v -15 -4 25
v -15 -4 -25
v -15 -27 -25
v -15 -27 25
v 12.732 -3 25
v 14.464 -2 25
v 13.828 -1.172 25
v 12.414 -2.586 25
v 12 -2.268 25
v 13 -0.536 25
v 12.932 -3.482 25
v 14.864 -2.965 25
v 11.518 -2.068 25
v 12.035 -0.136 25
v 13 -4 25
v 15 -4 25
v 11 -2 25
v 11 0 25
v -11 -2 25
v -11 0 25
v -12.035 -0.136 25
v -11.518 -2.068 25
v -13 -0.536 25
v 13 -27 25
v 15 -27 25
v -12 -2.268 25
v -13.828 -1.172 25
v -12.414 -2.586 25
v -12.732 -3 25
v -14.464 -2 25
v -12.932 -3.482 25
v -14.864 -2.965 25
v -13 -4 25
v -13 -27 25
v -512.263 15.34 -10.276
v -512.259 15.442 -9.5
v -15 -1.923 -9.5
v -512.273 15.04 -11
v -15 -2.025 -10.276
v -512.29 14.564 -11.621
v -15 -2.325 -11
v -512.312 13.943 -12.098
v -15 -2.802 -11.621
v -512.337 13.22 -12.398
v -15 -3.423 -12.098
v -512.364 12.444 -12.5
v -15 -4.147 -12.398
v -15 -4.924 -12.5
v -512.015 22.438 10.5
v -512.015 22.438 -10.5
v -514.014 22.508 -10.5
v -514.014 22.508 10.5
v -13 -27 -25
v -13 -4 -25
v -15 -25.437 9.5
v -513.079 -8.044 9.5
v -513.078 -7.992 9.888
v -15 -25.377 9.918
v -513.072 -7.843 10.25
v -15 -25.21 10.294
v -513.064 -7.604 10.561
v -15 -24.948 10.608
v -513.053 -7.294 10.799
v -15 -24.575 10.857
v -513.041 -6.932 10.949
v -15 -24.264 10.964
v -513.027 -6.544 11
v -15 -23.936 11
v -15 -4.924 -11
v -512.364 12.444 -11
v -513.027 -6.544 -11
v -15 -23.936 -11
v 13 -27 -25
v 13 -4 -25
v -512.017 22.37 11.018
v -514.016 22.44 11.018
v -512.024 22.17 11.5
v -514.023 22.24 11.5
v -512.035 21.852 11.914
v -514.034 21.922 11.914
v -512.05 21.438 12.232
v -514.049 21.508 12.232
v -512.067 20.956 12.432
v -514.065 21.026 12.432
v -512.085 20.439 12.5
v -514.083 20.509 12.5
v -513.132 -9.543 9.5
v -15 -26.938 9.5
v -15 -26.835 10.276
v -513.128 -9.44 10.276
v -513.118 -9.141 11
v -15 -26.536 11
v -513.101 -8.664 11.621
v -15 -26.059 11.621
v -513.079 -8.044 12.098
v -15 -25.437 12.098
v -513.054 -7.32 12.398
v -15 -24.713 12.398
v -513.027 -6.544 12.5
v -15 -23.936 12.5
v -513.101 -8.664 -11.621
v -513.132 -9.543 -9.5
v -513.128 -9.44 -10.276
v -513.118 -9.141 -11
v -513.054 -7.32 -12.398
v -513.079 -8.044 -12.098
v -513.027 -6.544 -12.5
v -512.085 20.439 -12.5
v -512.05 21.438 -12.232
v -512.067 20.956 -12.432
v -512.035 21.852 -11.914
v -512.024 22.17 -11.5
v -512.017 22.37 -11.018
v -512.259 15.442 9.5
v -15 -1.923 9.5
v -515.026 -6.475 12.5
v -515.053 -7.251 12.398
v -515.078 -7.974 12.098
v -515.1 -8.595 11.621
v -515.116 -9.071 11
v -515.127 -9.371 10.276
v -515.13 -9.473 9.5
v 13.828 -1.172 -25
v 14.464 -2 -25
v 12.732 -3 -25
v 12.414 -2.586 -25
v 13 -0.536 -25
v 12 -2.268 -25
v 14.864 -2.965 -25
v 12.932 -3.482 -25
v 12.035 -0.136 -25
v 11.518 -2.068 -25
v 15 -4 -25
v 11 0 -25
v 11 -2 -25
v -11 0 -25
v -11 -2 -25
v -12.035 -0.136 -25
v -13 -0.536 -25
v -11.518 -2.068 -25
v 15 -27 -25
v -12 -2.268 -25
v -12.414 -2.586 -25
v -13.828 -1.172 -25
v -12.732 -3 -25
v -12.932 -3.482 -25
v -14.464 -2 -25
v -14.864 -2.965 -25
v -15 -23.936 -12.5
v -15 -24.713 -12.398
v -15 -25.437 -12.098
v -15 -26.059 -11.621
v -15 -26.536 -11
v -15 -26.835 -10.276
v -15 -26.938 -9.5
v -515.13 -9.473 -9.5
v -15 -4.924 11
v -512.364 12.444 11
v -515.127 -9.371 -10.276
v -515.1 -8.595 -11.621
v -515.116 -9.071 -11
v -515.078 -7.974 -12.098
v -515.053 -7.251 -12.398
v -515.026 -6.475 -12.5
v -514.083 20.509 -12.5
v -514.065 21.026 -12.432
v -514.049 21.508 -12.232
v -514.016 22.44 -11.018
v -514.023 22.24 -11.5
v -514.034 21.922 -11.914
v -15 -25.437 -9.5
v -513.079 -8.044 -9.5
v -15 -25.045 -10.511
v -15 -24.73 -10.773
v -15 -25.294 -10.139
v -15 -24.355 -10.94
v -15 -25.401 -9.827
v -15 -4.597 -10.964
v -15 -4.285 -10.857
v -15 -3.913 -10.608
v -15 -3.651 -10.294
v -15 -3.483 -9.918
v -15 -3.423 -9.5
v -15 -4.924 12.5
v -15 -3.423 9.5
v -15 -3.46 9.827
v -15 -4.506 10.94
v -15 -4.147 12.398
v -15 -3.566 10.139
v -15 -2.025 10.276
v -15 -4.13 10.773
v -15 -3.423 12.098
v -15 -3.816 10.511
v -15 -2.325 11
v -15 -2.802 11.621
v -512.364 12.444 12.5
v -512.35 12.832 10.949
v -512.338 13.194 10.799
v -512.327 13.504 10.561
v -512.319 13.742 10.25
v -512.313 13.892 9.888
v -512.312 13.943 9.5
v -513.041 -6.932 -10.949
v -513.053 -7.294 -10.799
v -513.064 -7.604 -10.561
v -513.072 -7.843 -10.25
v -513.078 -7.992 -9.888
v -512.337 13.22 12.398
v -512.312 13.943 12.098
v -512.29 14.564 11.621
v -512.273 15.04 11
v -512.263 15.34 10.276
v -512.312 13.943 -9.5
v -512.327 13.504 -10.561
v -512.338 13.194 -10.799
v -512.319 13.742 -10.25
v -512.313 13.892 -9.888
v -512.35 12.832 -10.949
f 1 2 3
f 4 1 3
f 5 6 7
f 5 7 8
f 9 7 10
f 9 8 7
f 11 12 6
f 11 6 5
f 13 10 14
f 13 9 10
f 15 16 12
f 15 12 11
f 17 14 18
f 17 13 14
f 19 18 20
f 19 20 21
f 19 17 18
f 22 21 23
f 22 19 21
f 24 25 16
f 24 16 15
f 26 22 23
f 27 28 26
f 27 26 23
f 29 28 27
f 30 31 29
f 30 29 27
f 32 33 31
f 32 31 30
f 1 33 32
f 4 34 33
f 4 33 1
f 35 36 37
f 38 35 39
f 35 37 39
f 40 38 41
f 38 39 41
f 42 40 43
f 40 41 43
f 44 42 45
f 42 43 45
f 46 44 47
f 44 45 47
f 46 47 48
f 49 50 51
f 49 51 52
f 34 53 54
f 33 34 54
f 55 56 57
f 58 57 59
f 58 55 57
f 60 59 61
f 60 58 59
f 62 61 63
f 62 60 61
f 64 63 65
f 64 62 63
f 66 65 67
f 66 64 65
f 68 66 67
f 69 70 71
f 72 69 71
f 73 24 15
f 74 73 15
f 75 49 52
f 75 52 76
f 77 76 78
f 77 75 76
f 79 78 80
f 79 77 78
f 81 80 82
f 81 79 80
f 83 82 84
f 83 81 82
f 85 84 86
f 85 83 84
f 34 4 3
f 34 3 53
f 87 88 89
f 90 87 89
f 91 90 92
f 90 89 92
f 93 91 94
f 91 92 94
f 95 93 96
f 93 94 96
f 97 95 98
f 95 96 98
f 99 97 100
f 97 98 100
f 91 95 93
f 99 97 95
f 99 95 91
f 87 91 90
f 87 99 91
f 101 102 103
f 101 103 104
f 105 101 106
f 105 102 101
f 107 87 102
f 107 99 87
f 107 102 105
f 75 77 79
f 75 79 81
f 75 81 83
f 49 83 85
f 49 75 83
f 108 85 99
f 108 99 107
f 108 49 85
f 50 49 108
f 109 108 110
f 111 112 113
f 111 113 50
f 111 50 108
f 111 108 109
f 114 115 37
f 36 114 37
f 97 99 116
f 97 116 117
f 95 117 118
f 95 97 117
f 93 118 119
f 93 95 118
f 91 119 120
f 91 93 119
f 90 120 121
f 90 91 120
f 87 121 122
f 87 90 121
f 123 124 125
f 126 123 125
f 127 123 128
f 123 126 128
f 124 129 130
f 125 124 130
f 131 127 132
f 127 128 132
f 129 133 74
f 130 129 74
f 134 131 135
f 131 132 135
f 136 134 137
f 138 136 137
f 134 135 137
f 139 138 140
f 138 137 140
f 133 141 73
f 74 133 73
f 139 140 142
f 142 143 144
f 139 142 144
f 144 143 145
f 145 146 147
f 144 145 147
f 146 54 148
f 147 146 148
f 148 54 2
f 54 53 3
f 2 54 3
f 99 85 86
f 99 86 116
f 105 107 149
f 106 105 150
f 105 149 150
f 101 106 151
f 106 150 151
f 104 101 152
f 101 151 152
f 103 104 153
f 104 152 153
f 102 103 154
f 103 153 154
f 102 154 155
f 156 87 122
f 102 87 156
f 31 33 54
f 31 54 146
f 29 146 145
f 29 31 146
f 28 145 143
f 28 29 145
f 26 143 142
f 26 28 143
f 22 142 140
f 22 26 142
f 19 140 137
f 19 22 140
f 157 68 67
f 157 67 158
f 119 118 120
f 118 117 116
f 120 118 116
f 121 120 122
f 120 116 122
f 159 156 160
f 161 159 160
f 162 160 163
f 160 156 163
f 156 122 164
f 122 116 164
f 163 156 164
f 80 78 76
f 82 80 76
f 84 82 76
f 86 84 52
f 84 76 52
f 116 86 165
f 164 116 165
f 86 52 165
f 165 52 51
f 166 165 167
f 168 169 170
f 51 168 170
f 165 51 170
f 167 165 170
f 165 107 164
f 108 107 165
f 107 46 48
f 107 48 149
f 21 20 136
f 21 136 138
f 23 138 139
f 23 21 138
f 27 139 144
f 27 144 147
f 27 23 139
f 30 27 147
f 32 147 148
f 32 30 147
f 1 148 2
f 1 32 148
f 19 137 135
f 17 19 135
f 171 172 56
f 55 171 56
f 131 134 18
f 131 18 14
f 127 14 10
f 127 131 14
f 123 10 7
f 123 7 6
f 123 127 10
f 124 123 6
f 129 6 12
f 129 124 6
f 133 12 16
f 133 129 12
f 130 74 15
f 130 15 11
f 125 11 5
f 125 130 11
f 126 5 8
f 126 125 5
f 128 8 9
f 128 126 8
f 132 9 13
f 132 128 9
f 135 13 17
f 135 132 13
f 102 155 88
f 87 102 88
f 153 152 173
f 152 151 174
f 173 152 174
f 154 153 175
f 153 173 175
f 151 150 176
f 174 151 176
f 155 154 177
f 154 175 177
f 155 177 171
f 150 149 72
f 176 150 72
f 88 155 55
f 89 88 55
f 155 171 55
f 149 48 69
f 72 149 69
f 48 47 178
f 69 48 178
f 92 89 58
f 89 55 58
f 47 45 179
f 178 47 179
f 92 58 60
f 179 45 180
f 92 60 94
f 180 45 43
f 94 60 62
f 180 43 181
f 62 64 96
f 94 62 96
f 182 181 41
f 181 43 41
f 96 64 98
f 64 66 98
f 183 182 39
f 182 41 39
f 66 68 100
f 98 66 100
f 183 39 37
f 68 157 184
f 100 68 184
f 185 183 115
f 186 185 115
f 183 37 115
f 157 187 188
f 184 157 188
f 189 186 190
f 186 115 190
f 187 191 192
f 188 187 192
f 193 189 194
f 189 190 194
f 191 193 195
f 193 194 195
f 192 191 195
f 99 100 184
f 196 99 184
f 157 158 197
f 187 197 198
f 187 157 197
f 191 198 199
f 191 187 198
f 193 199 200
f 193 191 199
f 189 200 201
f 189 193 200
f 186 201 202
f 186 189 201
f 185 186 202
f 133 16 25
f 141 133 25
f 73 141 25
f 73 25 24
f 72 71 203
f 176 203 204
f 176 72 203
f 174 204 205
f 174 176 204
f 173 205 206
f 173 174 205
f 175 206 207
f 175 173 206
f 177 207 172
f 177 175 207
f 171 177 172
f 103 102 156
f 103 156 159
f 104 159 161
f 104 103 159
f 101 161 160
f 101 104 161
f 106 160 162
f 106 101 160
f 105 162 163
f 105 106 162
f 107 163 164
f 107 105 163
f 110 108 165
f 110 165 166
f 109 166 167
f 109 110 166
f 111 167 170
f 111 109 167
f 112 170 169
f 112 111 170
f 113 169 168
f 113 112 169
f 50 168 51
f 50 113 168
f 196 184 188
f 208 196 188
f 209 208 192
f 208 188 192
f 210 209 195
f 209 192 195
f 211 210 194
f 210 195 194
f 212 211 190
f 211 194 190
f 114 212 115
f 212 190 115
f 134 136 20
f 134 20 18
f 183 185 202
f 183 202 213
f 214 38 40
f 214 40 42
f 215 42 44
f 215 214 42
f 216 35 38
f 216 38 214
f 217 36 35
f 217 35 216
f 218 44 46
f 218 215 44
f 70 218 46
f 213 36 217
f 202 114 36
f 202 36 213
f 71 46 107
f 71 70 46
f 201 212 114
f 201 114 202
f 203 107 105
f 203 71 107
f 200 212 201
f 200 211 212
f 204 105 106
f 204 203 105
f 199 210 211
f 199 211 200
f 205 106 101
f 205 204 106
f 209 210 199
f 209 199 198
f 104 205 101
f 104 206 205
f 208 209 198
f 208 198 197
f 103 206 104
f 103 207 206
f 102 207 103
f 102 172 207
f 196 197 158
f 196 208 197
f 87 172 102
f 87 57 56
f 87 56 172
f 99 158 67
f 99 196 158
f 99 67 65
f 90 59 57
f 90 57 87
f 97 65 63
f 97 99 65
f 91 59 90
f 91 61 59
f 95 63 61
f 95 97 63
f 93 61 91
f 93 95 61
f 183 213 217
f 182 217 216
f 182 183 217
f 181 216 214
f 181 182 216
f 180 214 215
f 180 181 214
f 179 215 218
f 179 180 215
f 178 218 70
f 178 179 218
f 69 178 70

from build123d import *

# Parameters (mm, degrees)
SKETCH_1_W                     = 26
SKETCH_1_H                     = 50
SM_BASE_FLANGE_1_DEPTH         = 2
EDGE_FLANGE1_STRIP_W           = 12
EDGE_FLANGE1_STRIP_H           = 2
EDGE_FLANGE1_STRIP_CUT_DEPTH   = 50
EDGE_FLANGE1_STRIP_2_W         = 12
EDGE_FLANGE1_STRIP_2_H         = 2
EDGE_FLANGE1_STRIP_CUT_2_DEPTH = 50
EDGE_FLANGE1_DEPTH             = 50
EDGE_FLANGE1_BEND_DEPTH        = 50
F_2_X_2_X_0_25_1_DEPTH         = 500
SKETCH_15_W                    = 53.141638299
SKETCH_15_H                    = 32.279440364
CUT_EXTRUDE_1_DEPTH            = 500.488886686
EXTRUDE_2_DEPTH                = 2


# Sheet-metal steps are written as plain solids
with BuildPart() as part:
    # Эскиз1 → Базовая кромка1 (new body)
    with BuildSketch(Plane(origin=(0, 0, 0), x_dir=(1, 0, 0), z_dir=(0, 1, 0))):
        Rectangle(SKETCH_1_W, SKETCH_1_H)
    extrude(amount=-SM_BASE_FLANGE_1_DEPTH)

    # Edge-Flange1 strip (across the edge) → Edge-Flange1 strip cut (cut)
    with BuildSketch(Plane(origin=(13, -2, -25), x_dir=(-1, 0, 0), z_dir=(0, 0, 1))):
        with Locations((-4, -1)):
            Rectangle(EDGE_FLANGE1_STRIP_W, EDGE_FLANGE1_STRIP_H)
    extrude(amount=EDGE_FLANGE1_STRIP_CUT_DEPTH, mode=Mode.SUBTRACT)

    # Edge-Flange1 strip 2 (across the edge) → Edge-Flange1 strip cut 2 (cut)
    with BuildSketch(Plane(origin=(-13, -2, 25), x_dir=(1, 0, 0), z_dir=(0, 0, -1))):
        with Locations((-4, -1)):
            Rectangle(EDGE_FLANGE1_STRIP_2_W, EDGE_FLANGE1_STRIP_2_H)
    extrude(amount=EDGE_FLANGE1_STRIP_CUT_2_DEPTH, mode=Mode.SUBTRACT)

    # Edge-Flange1 section (across the edge) → Edge-Flange1 (add)
    with BuildSketch(Plane(origin=(13, -2, -25), x_dir=(-1, 0, 0), z_dir=(0, 0, 1))):
        with BuildLine():
            Line((-2, 2), (-2, 25))
            Line((-2, 25), (0, 25))
            Line((0, 25), (0, 2))
            ThreePointArc((0, 2), (0.585786438, 0.585786438), (2, 0))
            Line((2, 0), (2, -2))
            ThreePointArc((2, -2), (-0.828427125, -0.828427125), (-2, 2))
        make_face()
    extrude(amount=EDGE_FLANGE1_DEPTH)

    # Edge-Flange1 section 2 (across the edge) → Edge-Flange1 bend (add)
    with BuildSketch(Plane(origin=(-13, -2, 25), x_dir=(1, 0, 0), z_dir=(0, 0, -1))):
        with BuildLine():
            Line((-2, 2), (-2, 25))
            Line((-2, 25), (0, 25))
            Line((0, 25), (0, 2))
            ThreePointArc((0, 2), (0.585786438, 0.585786438), (2, 0))
            Line((2, 0), (2, -2))
            ThreePointArc((2, -2), (-0.828427125, -0.828427125), (-2, 2))
        make_face()
    extrude(amount=EDGE_FLANGE1_BEND_DEPTH)


with BuildPart() as body_2:
    # Sketch1 → Квадратная труба 2 X 2 X 0.25(1) (new body)
    with BuildSketch(Plane(origin=(-13, -14.5, 0), x_dir=(-0.03489949670250092, -0.9993908270190959, 0), z_dir=(-0.9993908270190959, 0.03489949670250092, 0))):
        with BuildLine():
            Line((-9.5, -12.5), (9.5, -12.5))
            ThreePointArc((9.5, -12.5), (11.621320344, -11.621320344), (12.5, -9.5))
            Line((12.5, -9.5), (12.5, 9.5))
            ThreePointArc((12.5, 9.5), (11.621320344, 11.621320344), (9.5, 12.5))
            Line((9.5, 12.5), (-9.5, 12.5))
            ThreePointArc((-9.5, 12.5), (-11.621320344, 11.621320344), (-12.5, 9.5))
            Line((-12.5, 9.5), (-12.5, -9.5))
            ThreePointArc((-12.5, -9.5), (-11.621320344, -11.621320344), (-9.5, -12.5))
        make_face()
        with BuildLine():
            Line((-9.5, -11), (9.5, -11))
            ThreePointArc((9.5, -11), (10.560660172, -10.560660172), (11, -9.5))
            Line((11, -9.5), (11, 9.5))
            ThreePointArc((11, 9.5), (10.560660172, 10.560660172), (9.5, 11))
            Line((9.5, 11), (-9.5, 11))
            ThreePointArc((-9.5, 11), (-10.560660172, 10.560660172), (-11, 9.5))
            Line((-11, 9.5), (-11, -9.5))
            ThreePointArc((-11, -9.5), (-10.560660172, -10.560660172), (-9.5, -11))
        make_face(mode=Mode.SUBTRACT)
    extrude(amount=F_2_X_2_X_0_25_1_DEPTH)

    # Эскиз15 → Вырез-Вытянуть1 (cut, through all)
    with BuildSketch(Plane.ZY.offset(15)):
        with Locations((-5.765575738, -15.221763434)):
            Rectangle(SKETCH_15_W, SKETCH_15_H)
    extrude(amount=-CUT_EXTRUDE_1_DEPTH, mode=Mode.SUBTRACT)


with BuildPart() as body_3:
    # Эскиз16 → Бобышка-Вытянуть2 (new body)
    with BuildSketch(Plane(origin=(-512.173845402, 17.885504795, 0), x_dir=(0, 0, 1), z_dir=(-0.9993908270190958, 0.034899496702500934, 0))):
        with BuildLine():
            Line((-10.5, 4.555139551), (10.5, 4.555139551))
            ThreePointArc((10.5, 4.555139551), (11.914213562, 3.969353113), (12.5, 2.555139551))
            Line((12.5, 2.555139551), (12.5, -24.444860449))
            ThreePointArc((12.5, -24.444860449), (11.621320344, -26.566180792), (9.5, -27.444860449))
            Line((9.5, -27.444860449), (-9.5, -27.444860449))
            ThreePointArc((-9.5, -27.444860449), (-11.621320344, -26.566180792), (-12.5, -24.444860449))
            Line((-12.5, -24.444860449), (-12.5, 2.555139551))
            ThreePointArc((-12.5, 2.555139551), (-11.914213562, 3.969353113), (-10.5, 4.555139551))
        make_face()
    extrude(amount=EXTRUDE_2_DEPTH)


solid = Compound([part.part, body_2.part, body_3.part])
